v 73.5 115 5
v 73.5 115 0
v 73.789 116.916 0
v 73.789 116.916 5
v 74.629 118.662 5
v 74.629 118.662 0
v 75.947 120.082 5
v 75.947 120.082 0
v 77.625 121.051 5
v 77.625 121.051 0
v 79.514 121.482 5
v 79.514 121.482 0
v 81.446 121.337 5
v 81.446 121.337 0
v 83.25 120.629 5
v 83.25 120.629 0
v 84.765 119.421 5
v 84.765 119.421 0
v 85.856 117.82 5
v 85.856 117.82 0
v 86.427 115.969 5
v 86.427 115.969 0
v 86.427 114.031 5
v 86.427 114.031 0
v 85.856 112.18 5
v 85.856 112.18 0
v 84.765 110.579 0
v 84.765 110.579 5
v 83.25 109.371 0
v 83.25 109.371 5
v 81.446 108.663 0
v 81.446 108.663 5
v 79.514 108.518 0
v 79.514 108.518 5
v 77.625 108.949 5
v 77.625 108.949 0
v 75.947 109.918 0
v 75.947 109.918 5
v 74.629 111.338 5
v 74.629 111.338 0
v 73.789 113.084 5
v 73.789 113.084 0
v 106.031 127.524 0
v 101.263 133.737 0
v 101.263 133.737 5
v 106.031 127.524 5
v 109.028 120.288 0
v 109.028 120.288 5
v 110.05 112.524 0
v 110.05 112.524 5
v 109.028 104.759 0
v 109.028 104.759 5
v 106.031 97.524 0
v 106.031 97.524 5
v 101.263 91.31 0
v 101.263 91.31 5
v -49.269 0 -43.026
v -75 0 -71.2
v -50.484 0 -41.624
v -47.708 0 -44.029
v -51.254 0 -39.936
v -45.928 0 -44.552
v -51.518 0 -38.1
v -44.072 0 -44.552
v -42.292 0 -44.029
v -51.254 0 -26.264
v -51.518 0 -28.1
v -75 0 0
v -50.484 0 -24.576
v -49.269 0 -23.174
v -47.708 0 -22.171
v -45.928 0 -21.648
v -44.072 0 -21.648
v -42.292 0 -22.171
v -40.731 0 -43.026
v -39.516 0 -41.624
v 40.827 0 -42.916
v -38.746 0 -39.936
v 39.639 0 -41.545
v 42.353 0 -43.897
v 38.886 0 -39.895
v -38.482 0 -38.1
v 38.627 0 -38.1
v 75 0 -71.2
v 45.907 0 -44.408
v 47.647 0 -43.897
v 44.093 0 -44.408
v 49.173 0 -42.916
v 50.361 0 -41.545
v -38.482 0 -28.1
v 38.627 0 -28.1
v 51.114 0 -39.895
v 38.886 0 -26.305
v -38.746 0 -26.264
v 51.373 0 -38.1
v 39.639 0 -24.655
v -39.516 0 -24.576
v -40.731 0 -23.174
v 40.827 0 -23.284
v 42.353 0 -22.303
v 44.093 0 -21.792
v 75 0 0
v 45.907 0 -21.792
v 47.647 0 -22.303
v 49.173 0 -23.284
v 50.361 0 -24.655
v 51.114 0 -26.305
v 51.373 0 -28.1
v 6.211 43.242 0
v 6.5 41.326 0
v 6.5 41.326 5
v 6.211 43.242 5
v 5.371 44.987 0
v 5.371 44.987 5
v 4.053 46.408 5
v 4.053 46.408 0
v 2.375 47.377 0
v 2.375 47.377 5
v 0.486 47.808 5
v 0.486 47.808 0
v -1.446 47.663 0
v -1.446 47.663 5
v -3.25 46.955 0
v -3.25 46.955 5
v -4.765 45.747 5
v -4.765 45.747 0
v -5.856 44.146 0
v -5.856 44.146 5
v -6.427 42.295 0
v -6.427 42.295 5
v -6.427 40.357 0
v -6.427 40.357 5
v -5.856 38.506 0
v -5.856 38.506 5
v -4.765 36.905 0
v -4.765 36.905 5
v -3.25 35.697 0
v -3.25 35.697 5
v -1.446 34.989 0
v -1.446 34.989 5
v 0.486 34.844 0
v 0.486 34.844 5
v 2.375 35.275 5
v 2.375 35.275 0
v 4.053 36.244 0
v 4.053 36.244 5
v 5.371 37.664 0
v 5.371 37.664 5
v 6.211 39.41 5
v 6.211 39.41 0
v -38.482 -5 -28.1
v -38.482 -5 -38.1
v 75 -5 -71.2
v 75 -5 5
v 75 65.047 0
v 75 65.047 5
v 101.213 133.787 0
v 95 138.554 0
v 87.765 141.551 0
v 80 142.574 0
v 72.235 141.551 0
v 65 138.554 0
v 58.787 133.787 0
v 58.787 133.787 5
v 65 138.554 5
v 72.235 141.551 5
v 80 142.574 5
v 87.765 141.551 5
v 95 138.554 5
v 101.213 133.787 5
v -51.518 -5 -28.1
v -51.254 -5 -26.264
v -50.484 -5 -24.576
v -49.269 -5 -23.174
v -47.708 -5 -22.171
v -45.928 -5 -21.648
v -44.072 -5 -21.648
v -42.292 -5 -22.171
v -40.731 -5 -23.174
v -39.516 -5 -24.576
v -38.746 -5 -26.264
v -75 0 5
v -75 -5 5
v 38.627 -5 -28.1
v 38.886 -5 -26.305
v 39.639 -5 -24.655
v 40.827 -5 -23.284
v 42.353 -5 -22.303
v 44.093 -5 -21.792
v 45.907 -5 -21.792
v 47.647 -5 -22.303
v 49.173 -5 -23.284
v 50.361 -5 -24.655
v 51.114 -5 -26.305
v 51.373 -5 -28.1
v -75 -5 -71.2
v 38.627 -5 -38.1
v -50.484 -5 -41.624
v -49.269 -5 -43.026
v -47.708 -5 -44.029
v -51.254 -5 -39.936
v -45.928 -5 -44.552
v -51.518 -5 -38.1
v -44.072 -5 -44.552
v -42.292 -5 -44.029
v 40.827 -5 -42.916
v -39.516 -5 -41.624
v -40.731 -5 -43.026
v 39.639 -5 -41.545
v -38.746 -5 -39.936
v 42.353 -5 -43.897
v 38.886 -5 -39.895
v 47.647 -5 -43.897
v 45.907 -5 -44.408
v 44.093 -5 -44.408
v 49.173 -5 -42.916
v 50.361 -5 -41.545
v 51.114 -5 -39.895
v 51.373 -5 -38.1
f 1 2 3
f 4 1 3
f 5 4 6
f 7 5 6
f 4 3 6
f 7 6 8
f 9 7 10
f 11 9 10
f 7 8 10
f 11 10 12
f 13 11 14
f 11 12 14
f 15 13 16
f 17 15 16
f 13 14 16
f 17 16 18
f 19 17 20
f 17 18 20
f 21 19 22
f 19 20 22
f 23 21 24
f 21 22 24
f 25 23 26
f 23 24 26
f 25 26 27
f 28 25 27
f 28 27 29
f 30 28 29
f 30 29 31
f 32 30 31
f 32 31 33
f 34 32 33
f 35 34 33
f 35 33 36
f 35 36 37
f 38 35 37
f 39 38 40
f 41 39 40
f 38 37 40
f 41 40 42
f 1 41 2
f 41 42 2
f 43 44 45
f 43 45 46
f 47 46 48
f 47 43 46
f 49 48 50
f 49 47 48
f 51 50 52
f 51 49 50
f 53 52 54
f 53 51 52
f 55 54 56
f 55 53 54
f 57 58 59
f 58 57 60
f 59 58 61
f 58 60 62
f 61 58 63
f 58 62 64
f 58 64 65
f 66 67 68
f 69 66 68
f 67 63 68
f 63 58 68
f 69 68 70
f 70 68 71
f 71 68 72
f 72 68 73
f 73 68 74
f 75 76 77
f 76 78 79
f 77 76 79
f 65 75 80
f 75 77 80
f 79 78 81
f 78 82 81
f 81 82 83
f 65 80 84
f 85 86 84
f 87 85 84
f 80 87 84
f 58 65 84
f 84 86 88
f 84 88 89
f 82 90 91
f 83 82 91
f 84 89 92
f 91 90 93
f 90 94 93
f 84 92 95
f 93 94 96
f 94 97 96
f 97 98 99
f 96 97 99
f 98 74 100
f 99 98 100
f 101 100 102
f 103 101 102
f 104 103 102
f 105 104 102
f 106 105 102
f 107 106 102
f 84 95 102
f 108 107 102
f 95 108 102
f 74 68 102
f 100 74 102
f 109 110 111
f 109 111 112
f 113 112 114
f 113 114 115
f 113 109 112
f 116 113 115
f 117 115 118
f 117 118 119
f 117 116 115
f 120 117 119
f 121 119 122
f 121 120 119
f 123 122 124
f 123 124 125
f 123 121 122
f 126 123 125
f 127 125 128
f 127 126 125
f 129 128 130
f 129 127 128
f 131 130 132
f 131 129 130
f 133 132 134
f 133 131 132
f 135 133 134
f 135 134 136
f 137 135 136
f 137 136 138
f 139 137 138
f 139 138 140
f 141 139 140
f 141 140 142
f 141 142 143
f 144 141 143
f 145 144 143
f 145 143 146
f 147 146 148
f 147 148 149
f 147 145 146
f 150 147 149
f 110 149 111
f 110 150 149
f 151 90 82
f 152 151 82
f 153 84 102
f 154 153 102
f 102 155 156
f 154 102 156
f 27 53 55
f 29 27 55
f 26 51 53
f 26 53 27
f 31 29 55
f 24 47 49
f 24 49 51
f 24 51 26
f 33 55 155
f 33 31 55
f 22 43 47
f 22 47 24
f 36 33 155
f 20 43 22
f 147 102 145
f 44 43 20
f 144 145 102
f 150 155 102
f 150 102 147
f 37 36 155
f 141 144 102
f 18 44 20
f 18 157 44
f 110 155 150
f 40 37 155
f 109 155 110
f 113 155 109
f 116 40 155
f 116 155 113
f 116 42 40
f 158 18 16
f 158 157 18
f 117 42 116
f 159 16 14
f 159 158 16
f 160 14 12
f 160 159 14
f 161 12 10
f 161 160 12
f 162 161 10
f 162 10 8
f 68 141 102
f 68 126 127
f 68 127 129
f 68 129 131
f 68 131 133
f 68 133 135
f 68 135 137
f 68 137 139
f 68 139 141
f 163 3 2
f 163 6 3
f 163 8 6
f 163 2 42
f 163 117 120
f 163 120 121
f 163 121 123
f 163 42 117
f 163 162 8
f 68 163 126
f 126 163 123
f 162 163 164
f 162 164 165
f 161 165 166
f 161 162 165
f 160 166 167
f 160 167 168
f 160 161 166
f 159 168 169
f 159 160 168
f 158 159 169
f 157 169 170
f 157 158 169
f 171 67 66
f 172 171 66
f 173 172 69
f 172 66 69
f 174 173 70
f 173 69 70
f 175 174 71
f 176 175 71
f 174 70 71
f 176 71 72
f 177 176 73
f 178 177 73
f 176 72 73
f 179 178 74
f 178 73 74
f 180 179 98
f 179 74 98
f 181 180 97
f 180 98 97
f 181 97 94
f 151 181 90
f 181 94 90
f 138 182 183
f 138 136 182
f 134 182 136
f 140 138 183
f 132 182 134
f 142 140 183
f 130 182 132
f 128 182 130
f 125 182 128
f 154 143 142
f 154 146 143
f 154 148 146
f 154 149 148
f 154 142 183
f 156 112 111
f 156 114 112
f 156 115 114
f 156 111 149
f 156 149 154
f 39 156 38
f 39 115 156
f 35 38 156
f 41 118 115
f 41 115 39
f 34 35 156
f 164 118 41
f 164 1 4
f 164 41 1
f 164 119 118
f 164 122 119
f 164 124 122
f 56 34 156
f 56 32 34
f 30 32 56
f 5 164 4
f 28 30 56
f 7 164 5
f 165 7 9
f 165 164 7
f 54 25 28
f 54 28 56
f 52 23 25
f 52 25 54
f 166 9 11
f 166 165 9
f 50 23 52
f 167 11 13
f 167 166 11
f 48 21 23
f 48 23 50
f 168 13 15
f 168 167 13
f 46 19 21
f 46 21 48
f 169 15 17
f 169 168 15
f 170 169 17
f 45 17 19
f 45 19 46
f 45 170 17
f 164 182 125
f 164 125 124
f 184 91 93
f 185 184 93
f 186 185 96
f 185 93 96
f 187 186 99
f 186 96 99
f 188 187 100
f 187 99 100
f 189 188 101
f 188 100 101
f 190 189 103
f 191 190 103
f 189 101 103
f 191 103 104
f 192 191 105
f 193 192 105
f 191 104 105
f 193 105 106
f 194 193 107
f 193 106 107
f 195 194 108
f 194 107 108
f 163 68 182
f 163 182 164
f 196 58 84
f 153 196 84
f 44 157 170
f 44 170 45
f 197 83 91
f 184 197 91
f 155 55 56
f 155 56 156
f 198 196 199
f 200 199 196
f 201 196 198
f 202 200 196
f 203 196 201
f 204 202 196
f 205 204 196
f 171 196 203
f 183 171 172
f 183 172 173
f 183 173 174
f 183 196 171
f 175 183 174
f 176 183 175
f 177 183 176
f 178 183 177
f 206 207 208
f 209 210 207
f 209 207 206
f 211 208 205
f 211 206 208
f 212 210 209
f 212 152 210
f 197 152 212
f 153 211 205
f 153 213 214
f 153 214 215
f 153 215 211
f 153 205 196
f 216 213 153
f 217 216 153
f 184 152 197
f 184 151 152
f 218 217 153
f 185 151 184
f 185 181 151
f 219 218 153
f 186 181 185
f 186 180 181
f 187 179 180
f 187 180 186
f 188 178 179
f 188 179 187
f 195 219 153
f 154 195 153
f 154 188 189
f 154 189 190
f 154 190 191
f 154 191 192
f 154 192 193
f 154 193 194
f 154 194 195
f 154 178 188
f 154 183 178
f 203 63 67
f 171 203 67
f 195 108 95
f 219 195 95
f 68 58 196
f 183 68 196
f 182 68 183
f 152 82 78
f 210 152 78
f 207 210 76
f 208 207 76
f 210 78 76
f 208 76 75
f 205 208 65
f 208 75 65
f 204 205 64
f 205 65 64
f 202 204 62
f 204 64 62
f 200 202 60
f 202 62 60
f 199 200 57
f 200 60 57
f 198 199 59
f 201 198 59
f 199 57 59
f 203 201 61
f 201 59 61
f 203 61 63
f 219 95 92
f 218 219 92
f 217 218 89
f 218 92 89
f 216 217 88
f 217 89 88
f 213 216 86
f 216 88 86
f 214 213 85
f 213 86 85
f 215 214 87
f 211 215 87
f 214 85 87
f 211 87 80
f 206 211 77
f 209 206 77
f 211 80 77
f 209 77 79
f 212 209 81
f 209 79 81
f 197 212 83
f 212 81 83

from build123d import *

# Parameters (mm, degrees)
CROQUIS1_R              = 6.5
SALIENTE_EXTRUIR1_DEPTH = 5
CROQUIS2_W              = 150
CROQUIS2_H              = 76.2
SALIENTE_EXTRUIR2_DEPTH = 5
CROQUIS3_R              = 6.5
CROQUIS3_R_2            = 10
SALIENTE_EXTRUIR3_DEPTH = 5


with BuildPart() as part:
    # Croquis1 → Saliente-Extruir1 (new body)
    with BuildSketch(Plane.XY):
        with BuildLine():
            Line((75, 0), (-75, 0))
            Line((-75, 0), (-21.213203436, 53.786796564))
            ThreePointArc((-21.213203436, 53.786796564), (0, 62.573593129), (21.213203436, 53.786796564))
            Line((21.213203436, 53.786796564), (75, 0))
        make_face()
        with Locations((0, 41.325890401)):
            Circle(CROQUIS1_R, mode=Mode.SUBTRACT)
    extrude(amount=SALIENTE_EXTRUIR1_DEPTH)

    # Croquis2 → Saliente-Extruir2 (add)
    with BuildSketch(Plane.XZ):
        with Locations((0, -33.1)):
            Rectangle(CROQUIS2_W, CROQUIS2_H)
        with BuildLine():
            Line((-38.481595315, -28.1), (-38.481595315, -38.1))
            ThreePointArc((-38.481595315, -38.1), (-45, -44.618404685), (-51.518404685, -38.1))
            Line((-51.518404685, -38.1), (-51.518404685, -28.1))
            ThreePointArc((-51.518404685, -28.1), (-45, -21.581595315), (-38.481595315, -28.1))
        make_face(mode=Mode.SUBTRACT)
        with BuildLine():
            Line((51.37253144, -28.1), (51.37253144, -38.1))
            ThreePointArc((51.37253144, -38.1), (45, -44.47253144), (38.62746856, -38.1))
            Line((38.62746856, -38.1), (38.62746856, -28.1))
            ThreePointArc((38.62746856, -28.1), (45, -21.72746856), (51.37253144, -28.1))
        make_face(mode=Mode.SUBTRACT)
    extrude(amount=SALIENTE_EXTRUIR2_DEPTH)

    # Croquis3 → Saliente-Extruir3 (add)
    with BuildSketch(Plane(origin=(0, 0, 0), x_dir=(-1, 0, 0), z_dir=(0, 0, -1))):
        with BuildLine():
            Line((75, 0), (-58.786796564, 133.786796564))
            ThreePointArc((-58.786796564, 133.786796564), (-80, 142.573593129), (-101.213203436, 133.786796564))
            Line((-101.213203436, 133.786796564), (-101.263160567, 133.736839433))
            ThreePointArc((-101.263160567, 133.736839433), (-110.049957131, 112.523635998), (-101.263160567, 91.310432562))
            Line((-101.263160567, 91.310432562), (-75, 65.047271996))
            Line((-75, 65.047271996), (-75, 0))
            Line((-75, 0), (75, 0))
        make_face()
        with Locations((-80, 115)):
            Circle(CROQUIS3_R, mode=Mode.SUBTRACT)
        with Locations((0, 41.325890401)):
            Circle(CROQUIS3_R_2, mode=Mode.SUBTRACT)
    extrude(amount=-SALIENTE_EXTRUIR3_DEPTH)


solid = part.part
